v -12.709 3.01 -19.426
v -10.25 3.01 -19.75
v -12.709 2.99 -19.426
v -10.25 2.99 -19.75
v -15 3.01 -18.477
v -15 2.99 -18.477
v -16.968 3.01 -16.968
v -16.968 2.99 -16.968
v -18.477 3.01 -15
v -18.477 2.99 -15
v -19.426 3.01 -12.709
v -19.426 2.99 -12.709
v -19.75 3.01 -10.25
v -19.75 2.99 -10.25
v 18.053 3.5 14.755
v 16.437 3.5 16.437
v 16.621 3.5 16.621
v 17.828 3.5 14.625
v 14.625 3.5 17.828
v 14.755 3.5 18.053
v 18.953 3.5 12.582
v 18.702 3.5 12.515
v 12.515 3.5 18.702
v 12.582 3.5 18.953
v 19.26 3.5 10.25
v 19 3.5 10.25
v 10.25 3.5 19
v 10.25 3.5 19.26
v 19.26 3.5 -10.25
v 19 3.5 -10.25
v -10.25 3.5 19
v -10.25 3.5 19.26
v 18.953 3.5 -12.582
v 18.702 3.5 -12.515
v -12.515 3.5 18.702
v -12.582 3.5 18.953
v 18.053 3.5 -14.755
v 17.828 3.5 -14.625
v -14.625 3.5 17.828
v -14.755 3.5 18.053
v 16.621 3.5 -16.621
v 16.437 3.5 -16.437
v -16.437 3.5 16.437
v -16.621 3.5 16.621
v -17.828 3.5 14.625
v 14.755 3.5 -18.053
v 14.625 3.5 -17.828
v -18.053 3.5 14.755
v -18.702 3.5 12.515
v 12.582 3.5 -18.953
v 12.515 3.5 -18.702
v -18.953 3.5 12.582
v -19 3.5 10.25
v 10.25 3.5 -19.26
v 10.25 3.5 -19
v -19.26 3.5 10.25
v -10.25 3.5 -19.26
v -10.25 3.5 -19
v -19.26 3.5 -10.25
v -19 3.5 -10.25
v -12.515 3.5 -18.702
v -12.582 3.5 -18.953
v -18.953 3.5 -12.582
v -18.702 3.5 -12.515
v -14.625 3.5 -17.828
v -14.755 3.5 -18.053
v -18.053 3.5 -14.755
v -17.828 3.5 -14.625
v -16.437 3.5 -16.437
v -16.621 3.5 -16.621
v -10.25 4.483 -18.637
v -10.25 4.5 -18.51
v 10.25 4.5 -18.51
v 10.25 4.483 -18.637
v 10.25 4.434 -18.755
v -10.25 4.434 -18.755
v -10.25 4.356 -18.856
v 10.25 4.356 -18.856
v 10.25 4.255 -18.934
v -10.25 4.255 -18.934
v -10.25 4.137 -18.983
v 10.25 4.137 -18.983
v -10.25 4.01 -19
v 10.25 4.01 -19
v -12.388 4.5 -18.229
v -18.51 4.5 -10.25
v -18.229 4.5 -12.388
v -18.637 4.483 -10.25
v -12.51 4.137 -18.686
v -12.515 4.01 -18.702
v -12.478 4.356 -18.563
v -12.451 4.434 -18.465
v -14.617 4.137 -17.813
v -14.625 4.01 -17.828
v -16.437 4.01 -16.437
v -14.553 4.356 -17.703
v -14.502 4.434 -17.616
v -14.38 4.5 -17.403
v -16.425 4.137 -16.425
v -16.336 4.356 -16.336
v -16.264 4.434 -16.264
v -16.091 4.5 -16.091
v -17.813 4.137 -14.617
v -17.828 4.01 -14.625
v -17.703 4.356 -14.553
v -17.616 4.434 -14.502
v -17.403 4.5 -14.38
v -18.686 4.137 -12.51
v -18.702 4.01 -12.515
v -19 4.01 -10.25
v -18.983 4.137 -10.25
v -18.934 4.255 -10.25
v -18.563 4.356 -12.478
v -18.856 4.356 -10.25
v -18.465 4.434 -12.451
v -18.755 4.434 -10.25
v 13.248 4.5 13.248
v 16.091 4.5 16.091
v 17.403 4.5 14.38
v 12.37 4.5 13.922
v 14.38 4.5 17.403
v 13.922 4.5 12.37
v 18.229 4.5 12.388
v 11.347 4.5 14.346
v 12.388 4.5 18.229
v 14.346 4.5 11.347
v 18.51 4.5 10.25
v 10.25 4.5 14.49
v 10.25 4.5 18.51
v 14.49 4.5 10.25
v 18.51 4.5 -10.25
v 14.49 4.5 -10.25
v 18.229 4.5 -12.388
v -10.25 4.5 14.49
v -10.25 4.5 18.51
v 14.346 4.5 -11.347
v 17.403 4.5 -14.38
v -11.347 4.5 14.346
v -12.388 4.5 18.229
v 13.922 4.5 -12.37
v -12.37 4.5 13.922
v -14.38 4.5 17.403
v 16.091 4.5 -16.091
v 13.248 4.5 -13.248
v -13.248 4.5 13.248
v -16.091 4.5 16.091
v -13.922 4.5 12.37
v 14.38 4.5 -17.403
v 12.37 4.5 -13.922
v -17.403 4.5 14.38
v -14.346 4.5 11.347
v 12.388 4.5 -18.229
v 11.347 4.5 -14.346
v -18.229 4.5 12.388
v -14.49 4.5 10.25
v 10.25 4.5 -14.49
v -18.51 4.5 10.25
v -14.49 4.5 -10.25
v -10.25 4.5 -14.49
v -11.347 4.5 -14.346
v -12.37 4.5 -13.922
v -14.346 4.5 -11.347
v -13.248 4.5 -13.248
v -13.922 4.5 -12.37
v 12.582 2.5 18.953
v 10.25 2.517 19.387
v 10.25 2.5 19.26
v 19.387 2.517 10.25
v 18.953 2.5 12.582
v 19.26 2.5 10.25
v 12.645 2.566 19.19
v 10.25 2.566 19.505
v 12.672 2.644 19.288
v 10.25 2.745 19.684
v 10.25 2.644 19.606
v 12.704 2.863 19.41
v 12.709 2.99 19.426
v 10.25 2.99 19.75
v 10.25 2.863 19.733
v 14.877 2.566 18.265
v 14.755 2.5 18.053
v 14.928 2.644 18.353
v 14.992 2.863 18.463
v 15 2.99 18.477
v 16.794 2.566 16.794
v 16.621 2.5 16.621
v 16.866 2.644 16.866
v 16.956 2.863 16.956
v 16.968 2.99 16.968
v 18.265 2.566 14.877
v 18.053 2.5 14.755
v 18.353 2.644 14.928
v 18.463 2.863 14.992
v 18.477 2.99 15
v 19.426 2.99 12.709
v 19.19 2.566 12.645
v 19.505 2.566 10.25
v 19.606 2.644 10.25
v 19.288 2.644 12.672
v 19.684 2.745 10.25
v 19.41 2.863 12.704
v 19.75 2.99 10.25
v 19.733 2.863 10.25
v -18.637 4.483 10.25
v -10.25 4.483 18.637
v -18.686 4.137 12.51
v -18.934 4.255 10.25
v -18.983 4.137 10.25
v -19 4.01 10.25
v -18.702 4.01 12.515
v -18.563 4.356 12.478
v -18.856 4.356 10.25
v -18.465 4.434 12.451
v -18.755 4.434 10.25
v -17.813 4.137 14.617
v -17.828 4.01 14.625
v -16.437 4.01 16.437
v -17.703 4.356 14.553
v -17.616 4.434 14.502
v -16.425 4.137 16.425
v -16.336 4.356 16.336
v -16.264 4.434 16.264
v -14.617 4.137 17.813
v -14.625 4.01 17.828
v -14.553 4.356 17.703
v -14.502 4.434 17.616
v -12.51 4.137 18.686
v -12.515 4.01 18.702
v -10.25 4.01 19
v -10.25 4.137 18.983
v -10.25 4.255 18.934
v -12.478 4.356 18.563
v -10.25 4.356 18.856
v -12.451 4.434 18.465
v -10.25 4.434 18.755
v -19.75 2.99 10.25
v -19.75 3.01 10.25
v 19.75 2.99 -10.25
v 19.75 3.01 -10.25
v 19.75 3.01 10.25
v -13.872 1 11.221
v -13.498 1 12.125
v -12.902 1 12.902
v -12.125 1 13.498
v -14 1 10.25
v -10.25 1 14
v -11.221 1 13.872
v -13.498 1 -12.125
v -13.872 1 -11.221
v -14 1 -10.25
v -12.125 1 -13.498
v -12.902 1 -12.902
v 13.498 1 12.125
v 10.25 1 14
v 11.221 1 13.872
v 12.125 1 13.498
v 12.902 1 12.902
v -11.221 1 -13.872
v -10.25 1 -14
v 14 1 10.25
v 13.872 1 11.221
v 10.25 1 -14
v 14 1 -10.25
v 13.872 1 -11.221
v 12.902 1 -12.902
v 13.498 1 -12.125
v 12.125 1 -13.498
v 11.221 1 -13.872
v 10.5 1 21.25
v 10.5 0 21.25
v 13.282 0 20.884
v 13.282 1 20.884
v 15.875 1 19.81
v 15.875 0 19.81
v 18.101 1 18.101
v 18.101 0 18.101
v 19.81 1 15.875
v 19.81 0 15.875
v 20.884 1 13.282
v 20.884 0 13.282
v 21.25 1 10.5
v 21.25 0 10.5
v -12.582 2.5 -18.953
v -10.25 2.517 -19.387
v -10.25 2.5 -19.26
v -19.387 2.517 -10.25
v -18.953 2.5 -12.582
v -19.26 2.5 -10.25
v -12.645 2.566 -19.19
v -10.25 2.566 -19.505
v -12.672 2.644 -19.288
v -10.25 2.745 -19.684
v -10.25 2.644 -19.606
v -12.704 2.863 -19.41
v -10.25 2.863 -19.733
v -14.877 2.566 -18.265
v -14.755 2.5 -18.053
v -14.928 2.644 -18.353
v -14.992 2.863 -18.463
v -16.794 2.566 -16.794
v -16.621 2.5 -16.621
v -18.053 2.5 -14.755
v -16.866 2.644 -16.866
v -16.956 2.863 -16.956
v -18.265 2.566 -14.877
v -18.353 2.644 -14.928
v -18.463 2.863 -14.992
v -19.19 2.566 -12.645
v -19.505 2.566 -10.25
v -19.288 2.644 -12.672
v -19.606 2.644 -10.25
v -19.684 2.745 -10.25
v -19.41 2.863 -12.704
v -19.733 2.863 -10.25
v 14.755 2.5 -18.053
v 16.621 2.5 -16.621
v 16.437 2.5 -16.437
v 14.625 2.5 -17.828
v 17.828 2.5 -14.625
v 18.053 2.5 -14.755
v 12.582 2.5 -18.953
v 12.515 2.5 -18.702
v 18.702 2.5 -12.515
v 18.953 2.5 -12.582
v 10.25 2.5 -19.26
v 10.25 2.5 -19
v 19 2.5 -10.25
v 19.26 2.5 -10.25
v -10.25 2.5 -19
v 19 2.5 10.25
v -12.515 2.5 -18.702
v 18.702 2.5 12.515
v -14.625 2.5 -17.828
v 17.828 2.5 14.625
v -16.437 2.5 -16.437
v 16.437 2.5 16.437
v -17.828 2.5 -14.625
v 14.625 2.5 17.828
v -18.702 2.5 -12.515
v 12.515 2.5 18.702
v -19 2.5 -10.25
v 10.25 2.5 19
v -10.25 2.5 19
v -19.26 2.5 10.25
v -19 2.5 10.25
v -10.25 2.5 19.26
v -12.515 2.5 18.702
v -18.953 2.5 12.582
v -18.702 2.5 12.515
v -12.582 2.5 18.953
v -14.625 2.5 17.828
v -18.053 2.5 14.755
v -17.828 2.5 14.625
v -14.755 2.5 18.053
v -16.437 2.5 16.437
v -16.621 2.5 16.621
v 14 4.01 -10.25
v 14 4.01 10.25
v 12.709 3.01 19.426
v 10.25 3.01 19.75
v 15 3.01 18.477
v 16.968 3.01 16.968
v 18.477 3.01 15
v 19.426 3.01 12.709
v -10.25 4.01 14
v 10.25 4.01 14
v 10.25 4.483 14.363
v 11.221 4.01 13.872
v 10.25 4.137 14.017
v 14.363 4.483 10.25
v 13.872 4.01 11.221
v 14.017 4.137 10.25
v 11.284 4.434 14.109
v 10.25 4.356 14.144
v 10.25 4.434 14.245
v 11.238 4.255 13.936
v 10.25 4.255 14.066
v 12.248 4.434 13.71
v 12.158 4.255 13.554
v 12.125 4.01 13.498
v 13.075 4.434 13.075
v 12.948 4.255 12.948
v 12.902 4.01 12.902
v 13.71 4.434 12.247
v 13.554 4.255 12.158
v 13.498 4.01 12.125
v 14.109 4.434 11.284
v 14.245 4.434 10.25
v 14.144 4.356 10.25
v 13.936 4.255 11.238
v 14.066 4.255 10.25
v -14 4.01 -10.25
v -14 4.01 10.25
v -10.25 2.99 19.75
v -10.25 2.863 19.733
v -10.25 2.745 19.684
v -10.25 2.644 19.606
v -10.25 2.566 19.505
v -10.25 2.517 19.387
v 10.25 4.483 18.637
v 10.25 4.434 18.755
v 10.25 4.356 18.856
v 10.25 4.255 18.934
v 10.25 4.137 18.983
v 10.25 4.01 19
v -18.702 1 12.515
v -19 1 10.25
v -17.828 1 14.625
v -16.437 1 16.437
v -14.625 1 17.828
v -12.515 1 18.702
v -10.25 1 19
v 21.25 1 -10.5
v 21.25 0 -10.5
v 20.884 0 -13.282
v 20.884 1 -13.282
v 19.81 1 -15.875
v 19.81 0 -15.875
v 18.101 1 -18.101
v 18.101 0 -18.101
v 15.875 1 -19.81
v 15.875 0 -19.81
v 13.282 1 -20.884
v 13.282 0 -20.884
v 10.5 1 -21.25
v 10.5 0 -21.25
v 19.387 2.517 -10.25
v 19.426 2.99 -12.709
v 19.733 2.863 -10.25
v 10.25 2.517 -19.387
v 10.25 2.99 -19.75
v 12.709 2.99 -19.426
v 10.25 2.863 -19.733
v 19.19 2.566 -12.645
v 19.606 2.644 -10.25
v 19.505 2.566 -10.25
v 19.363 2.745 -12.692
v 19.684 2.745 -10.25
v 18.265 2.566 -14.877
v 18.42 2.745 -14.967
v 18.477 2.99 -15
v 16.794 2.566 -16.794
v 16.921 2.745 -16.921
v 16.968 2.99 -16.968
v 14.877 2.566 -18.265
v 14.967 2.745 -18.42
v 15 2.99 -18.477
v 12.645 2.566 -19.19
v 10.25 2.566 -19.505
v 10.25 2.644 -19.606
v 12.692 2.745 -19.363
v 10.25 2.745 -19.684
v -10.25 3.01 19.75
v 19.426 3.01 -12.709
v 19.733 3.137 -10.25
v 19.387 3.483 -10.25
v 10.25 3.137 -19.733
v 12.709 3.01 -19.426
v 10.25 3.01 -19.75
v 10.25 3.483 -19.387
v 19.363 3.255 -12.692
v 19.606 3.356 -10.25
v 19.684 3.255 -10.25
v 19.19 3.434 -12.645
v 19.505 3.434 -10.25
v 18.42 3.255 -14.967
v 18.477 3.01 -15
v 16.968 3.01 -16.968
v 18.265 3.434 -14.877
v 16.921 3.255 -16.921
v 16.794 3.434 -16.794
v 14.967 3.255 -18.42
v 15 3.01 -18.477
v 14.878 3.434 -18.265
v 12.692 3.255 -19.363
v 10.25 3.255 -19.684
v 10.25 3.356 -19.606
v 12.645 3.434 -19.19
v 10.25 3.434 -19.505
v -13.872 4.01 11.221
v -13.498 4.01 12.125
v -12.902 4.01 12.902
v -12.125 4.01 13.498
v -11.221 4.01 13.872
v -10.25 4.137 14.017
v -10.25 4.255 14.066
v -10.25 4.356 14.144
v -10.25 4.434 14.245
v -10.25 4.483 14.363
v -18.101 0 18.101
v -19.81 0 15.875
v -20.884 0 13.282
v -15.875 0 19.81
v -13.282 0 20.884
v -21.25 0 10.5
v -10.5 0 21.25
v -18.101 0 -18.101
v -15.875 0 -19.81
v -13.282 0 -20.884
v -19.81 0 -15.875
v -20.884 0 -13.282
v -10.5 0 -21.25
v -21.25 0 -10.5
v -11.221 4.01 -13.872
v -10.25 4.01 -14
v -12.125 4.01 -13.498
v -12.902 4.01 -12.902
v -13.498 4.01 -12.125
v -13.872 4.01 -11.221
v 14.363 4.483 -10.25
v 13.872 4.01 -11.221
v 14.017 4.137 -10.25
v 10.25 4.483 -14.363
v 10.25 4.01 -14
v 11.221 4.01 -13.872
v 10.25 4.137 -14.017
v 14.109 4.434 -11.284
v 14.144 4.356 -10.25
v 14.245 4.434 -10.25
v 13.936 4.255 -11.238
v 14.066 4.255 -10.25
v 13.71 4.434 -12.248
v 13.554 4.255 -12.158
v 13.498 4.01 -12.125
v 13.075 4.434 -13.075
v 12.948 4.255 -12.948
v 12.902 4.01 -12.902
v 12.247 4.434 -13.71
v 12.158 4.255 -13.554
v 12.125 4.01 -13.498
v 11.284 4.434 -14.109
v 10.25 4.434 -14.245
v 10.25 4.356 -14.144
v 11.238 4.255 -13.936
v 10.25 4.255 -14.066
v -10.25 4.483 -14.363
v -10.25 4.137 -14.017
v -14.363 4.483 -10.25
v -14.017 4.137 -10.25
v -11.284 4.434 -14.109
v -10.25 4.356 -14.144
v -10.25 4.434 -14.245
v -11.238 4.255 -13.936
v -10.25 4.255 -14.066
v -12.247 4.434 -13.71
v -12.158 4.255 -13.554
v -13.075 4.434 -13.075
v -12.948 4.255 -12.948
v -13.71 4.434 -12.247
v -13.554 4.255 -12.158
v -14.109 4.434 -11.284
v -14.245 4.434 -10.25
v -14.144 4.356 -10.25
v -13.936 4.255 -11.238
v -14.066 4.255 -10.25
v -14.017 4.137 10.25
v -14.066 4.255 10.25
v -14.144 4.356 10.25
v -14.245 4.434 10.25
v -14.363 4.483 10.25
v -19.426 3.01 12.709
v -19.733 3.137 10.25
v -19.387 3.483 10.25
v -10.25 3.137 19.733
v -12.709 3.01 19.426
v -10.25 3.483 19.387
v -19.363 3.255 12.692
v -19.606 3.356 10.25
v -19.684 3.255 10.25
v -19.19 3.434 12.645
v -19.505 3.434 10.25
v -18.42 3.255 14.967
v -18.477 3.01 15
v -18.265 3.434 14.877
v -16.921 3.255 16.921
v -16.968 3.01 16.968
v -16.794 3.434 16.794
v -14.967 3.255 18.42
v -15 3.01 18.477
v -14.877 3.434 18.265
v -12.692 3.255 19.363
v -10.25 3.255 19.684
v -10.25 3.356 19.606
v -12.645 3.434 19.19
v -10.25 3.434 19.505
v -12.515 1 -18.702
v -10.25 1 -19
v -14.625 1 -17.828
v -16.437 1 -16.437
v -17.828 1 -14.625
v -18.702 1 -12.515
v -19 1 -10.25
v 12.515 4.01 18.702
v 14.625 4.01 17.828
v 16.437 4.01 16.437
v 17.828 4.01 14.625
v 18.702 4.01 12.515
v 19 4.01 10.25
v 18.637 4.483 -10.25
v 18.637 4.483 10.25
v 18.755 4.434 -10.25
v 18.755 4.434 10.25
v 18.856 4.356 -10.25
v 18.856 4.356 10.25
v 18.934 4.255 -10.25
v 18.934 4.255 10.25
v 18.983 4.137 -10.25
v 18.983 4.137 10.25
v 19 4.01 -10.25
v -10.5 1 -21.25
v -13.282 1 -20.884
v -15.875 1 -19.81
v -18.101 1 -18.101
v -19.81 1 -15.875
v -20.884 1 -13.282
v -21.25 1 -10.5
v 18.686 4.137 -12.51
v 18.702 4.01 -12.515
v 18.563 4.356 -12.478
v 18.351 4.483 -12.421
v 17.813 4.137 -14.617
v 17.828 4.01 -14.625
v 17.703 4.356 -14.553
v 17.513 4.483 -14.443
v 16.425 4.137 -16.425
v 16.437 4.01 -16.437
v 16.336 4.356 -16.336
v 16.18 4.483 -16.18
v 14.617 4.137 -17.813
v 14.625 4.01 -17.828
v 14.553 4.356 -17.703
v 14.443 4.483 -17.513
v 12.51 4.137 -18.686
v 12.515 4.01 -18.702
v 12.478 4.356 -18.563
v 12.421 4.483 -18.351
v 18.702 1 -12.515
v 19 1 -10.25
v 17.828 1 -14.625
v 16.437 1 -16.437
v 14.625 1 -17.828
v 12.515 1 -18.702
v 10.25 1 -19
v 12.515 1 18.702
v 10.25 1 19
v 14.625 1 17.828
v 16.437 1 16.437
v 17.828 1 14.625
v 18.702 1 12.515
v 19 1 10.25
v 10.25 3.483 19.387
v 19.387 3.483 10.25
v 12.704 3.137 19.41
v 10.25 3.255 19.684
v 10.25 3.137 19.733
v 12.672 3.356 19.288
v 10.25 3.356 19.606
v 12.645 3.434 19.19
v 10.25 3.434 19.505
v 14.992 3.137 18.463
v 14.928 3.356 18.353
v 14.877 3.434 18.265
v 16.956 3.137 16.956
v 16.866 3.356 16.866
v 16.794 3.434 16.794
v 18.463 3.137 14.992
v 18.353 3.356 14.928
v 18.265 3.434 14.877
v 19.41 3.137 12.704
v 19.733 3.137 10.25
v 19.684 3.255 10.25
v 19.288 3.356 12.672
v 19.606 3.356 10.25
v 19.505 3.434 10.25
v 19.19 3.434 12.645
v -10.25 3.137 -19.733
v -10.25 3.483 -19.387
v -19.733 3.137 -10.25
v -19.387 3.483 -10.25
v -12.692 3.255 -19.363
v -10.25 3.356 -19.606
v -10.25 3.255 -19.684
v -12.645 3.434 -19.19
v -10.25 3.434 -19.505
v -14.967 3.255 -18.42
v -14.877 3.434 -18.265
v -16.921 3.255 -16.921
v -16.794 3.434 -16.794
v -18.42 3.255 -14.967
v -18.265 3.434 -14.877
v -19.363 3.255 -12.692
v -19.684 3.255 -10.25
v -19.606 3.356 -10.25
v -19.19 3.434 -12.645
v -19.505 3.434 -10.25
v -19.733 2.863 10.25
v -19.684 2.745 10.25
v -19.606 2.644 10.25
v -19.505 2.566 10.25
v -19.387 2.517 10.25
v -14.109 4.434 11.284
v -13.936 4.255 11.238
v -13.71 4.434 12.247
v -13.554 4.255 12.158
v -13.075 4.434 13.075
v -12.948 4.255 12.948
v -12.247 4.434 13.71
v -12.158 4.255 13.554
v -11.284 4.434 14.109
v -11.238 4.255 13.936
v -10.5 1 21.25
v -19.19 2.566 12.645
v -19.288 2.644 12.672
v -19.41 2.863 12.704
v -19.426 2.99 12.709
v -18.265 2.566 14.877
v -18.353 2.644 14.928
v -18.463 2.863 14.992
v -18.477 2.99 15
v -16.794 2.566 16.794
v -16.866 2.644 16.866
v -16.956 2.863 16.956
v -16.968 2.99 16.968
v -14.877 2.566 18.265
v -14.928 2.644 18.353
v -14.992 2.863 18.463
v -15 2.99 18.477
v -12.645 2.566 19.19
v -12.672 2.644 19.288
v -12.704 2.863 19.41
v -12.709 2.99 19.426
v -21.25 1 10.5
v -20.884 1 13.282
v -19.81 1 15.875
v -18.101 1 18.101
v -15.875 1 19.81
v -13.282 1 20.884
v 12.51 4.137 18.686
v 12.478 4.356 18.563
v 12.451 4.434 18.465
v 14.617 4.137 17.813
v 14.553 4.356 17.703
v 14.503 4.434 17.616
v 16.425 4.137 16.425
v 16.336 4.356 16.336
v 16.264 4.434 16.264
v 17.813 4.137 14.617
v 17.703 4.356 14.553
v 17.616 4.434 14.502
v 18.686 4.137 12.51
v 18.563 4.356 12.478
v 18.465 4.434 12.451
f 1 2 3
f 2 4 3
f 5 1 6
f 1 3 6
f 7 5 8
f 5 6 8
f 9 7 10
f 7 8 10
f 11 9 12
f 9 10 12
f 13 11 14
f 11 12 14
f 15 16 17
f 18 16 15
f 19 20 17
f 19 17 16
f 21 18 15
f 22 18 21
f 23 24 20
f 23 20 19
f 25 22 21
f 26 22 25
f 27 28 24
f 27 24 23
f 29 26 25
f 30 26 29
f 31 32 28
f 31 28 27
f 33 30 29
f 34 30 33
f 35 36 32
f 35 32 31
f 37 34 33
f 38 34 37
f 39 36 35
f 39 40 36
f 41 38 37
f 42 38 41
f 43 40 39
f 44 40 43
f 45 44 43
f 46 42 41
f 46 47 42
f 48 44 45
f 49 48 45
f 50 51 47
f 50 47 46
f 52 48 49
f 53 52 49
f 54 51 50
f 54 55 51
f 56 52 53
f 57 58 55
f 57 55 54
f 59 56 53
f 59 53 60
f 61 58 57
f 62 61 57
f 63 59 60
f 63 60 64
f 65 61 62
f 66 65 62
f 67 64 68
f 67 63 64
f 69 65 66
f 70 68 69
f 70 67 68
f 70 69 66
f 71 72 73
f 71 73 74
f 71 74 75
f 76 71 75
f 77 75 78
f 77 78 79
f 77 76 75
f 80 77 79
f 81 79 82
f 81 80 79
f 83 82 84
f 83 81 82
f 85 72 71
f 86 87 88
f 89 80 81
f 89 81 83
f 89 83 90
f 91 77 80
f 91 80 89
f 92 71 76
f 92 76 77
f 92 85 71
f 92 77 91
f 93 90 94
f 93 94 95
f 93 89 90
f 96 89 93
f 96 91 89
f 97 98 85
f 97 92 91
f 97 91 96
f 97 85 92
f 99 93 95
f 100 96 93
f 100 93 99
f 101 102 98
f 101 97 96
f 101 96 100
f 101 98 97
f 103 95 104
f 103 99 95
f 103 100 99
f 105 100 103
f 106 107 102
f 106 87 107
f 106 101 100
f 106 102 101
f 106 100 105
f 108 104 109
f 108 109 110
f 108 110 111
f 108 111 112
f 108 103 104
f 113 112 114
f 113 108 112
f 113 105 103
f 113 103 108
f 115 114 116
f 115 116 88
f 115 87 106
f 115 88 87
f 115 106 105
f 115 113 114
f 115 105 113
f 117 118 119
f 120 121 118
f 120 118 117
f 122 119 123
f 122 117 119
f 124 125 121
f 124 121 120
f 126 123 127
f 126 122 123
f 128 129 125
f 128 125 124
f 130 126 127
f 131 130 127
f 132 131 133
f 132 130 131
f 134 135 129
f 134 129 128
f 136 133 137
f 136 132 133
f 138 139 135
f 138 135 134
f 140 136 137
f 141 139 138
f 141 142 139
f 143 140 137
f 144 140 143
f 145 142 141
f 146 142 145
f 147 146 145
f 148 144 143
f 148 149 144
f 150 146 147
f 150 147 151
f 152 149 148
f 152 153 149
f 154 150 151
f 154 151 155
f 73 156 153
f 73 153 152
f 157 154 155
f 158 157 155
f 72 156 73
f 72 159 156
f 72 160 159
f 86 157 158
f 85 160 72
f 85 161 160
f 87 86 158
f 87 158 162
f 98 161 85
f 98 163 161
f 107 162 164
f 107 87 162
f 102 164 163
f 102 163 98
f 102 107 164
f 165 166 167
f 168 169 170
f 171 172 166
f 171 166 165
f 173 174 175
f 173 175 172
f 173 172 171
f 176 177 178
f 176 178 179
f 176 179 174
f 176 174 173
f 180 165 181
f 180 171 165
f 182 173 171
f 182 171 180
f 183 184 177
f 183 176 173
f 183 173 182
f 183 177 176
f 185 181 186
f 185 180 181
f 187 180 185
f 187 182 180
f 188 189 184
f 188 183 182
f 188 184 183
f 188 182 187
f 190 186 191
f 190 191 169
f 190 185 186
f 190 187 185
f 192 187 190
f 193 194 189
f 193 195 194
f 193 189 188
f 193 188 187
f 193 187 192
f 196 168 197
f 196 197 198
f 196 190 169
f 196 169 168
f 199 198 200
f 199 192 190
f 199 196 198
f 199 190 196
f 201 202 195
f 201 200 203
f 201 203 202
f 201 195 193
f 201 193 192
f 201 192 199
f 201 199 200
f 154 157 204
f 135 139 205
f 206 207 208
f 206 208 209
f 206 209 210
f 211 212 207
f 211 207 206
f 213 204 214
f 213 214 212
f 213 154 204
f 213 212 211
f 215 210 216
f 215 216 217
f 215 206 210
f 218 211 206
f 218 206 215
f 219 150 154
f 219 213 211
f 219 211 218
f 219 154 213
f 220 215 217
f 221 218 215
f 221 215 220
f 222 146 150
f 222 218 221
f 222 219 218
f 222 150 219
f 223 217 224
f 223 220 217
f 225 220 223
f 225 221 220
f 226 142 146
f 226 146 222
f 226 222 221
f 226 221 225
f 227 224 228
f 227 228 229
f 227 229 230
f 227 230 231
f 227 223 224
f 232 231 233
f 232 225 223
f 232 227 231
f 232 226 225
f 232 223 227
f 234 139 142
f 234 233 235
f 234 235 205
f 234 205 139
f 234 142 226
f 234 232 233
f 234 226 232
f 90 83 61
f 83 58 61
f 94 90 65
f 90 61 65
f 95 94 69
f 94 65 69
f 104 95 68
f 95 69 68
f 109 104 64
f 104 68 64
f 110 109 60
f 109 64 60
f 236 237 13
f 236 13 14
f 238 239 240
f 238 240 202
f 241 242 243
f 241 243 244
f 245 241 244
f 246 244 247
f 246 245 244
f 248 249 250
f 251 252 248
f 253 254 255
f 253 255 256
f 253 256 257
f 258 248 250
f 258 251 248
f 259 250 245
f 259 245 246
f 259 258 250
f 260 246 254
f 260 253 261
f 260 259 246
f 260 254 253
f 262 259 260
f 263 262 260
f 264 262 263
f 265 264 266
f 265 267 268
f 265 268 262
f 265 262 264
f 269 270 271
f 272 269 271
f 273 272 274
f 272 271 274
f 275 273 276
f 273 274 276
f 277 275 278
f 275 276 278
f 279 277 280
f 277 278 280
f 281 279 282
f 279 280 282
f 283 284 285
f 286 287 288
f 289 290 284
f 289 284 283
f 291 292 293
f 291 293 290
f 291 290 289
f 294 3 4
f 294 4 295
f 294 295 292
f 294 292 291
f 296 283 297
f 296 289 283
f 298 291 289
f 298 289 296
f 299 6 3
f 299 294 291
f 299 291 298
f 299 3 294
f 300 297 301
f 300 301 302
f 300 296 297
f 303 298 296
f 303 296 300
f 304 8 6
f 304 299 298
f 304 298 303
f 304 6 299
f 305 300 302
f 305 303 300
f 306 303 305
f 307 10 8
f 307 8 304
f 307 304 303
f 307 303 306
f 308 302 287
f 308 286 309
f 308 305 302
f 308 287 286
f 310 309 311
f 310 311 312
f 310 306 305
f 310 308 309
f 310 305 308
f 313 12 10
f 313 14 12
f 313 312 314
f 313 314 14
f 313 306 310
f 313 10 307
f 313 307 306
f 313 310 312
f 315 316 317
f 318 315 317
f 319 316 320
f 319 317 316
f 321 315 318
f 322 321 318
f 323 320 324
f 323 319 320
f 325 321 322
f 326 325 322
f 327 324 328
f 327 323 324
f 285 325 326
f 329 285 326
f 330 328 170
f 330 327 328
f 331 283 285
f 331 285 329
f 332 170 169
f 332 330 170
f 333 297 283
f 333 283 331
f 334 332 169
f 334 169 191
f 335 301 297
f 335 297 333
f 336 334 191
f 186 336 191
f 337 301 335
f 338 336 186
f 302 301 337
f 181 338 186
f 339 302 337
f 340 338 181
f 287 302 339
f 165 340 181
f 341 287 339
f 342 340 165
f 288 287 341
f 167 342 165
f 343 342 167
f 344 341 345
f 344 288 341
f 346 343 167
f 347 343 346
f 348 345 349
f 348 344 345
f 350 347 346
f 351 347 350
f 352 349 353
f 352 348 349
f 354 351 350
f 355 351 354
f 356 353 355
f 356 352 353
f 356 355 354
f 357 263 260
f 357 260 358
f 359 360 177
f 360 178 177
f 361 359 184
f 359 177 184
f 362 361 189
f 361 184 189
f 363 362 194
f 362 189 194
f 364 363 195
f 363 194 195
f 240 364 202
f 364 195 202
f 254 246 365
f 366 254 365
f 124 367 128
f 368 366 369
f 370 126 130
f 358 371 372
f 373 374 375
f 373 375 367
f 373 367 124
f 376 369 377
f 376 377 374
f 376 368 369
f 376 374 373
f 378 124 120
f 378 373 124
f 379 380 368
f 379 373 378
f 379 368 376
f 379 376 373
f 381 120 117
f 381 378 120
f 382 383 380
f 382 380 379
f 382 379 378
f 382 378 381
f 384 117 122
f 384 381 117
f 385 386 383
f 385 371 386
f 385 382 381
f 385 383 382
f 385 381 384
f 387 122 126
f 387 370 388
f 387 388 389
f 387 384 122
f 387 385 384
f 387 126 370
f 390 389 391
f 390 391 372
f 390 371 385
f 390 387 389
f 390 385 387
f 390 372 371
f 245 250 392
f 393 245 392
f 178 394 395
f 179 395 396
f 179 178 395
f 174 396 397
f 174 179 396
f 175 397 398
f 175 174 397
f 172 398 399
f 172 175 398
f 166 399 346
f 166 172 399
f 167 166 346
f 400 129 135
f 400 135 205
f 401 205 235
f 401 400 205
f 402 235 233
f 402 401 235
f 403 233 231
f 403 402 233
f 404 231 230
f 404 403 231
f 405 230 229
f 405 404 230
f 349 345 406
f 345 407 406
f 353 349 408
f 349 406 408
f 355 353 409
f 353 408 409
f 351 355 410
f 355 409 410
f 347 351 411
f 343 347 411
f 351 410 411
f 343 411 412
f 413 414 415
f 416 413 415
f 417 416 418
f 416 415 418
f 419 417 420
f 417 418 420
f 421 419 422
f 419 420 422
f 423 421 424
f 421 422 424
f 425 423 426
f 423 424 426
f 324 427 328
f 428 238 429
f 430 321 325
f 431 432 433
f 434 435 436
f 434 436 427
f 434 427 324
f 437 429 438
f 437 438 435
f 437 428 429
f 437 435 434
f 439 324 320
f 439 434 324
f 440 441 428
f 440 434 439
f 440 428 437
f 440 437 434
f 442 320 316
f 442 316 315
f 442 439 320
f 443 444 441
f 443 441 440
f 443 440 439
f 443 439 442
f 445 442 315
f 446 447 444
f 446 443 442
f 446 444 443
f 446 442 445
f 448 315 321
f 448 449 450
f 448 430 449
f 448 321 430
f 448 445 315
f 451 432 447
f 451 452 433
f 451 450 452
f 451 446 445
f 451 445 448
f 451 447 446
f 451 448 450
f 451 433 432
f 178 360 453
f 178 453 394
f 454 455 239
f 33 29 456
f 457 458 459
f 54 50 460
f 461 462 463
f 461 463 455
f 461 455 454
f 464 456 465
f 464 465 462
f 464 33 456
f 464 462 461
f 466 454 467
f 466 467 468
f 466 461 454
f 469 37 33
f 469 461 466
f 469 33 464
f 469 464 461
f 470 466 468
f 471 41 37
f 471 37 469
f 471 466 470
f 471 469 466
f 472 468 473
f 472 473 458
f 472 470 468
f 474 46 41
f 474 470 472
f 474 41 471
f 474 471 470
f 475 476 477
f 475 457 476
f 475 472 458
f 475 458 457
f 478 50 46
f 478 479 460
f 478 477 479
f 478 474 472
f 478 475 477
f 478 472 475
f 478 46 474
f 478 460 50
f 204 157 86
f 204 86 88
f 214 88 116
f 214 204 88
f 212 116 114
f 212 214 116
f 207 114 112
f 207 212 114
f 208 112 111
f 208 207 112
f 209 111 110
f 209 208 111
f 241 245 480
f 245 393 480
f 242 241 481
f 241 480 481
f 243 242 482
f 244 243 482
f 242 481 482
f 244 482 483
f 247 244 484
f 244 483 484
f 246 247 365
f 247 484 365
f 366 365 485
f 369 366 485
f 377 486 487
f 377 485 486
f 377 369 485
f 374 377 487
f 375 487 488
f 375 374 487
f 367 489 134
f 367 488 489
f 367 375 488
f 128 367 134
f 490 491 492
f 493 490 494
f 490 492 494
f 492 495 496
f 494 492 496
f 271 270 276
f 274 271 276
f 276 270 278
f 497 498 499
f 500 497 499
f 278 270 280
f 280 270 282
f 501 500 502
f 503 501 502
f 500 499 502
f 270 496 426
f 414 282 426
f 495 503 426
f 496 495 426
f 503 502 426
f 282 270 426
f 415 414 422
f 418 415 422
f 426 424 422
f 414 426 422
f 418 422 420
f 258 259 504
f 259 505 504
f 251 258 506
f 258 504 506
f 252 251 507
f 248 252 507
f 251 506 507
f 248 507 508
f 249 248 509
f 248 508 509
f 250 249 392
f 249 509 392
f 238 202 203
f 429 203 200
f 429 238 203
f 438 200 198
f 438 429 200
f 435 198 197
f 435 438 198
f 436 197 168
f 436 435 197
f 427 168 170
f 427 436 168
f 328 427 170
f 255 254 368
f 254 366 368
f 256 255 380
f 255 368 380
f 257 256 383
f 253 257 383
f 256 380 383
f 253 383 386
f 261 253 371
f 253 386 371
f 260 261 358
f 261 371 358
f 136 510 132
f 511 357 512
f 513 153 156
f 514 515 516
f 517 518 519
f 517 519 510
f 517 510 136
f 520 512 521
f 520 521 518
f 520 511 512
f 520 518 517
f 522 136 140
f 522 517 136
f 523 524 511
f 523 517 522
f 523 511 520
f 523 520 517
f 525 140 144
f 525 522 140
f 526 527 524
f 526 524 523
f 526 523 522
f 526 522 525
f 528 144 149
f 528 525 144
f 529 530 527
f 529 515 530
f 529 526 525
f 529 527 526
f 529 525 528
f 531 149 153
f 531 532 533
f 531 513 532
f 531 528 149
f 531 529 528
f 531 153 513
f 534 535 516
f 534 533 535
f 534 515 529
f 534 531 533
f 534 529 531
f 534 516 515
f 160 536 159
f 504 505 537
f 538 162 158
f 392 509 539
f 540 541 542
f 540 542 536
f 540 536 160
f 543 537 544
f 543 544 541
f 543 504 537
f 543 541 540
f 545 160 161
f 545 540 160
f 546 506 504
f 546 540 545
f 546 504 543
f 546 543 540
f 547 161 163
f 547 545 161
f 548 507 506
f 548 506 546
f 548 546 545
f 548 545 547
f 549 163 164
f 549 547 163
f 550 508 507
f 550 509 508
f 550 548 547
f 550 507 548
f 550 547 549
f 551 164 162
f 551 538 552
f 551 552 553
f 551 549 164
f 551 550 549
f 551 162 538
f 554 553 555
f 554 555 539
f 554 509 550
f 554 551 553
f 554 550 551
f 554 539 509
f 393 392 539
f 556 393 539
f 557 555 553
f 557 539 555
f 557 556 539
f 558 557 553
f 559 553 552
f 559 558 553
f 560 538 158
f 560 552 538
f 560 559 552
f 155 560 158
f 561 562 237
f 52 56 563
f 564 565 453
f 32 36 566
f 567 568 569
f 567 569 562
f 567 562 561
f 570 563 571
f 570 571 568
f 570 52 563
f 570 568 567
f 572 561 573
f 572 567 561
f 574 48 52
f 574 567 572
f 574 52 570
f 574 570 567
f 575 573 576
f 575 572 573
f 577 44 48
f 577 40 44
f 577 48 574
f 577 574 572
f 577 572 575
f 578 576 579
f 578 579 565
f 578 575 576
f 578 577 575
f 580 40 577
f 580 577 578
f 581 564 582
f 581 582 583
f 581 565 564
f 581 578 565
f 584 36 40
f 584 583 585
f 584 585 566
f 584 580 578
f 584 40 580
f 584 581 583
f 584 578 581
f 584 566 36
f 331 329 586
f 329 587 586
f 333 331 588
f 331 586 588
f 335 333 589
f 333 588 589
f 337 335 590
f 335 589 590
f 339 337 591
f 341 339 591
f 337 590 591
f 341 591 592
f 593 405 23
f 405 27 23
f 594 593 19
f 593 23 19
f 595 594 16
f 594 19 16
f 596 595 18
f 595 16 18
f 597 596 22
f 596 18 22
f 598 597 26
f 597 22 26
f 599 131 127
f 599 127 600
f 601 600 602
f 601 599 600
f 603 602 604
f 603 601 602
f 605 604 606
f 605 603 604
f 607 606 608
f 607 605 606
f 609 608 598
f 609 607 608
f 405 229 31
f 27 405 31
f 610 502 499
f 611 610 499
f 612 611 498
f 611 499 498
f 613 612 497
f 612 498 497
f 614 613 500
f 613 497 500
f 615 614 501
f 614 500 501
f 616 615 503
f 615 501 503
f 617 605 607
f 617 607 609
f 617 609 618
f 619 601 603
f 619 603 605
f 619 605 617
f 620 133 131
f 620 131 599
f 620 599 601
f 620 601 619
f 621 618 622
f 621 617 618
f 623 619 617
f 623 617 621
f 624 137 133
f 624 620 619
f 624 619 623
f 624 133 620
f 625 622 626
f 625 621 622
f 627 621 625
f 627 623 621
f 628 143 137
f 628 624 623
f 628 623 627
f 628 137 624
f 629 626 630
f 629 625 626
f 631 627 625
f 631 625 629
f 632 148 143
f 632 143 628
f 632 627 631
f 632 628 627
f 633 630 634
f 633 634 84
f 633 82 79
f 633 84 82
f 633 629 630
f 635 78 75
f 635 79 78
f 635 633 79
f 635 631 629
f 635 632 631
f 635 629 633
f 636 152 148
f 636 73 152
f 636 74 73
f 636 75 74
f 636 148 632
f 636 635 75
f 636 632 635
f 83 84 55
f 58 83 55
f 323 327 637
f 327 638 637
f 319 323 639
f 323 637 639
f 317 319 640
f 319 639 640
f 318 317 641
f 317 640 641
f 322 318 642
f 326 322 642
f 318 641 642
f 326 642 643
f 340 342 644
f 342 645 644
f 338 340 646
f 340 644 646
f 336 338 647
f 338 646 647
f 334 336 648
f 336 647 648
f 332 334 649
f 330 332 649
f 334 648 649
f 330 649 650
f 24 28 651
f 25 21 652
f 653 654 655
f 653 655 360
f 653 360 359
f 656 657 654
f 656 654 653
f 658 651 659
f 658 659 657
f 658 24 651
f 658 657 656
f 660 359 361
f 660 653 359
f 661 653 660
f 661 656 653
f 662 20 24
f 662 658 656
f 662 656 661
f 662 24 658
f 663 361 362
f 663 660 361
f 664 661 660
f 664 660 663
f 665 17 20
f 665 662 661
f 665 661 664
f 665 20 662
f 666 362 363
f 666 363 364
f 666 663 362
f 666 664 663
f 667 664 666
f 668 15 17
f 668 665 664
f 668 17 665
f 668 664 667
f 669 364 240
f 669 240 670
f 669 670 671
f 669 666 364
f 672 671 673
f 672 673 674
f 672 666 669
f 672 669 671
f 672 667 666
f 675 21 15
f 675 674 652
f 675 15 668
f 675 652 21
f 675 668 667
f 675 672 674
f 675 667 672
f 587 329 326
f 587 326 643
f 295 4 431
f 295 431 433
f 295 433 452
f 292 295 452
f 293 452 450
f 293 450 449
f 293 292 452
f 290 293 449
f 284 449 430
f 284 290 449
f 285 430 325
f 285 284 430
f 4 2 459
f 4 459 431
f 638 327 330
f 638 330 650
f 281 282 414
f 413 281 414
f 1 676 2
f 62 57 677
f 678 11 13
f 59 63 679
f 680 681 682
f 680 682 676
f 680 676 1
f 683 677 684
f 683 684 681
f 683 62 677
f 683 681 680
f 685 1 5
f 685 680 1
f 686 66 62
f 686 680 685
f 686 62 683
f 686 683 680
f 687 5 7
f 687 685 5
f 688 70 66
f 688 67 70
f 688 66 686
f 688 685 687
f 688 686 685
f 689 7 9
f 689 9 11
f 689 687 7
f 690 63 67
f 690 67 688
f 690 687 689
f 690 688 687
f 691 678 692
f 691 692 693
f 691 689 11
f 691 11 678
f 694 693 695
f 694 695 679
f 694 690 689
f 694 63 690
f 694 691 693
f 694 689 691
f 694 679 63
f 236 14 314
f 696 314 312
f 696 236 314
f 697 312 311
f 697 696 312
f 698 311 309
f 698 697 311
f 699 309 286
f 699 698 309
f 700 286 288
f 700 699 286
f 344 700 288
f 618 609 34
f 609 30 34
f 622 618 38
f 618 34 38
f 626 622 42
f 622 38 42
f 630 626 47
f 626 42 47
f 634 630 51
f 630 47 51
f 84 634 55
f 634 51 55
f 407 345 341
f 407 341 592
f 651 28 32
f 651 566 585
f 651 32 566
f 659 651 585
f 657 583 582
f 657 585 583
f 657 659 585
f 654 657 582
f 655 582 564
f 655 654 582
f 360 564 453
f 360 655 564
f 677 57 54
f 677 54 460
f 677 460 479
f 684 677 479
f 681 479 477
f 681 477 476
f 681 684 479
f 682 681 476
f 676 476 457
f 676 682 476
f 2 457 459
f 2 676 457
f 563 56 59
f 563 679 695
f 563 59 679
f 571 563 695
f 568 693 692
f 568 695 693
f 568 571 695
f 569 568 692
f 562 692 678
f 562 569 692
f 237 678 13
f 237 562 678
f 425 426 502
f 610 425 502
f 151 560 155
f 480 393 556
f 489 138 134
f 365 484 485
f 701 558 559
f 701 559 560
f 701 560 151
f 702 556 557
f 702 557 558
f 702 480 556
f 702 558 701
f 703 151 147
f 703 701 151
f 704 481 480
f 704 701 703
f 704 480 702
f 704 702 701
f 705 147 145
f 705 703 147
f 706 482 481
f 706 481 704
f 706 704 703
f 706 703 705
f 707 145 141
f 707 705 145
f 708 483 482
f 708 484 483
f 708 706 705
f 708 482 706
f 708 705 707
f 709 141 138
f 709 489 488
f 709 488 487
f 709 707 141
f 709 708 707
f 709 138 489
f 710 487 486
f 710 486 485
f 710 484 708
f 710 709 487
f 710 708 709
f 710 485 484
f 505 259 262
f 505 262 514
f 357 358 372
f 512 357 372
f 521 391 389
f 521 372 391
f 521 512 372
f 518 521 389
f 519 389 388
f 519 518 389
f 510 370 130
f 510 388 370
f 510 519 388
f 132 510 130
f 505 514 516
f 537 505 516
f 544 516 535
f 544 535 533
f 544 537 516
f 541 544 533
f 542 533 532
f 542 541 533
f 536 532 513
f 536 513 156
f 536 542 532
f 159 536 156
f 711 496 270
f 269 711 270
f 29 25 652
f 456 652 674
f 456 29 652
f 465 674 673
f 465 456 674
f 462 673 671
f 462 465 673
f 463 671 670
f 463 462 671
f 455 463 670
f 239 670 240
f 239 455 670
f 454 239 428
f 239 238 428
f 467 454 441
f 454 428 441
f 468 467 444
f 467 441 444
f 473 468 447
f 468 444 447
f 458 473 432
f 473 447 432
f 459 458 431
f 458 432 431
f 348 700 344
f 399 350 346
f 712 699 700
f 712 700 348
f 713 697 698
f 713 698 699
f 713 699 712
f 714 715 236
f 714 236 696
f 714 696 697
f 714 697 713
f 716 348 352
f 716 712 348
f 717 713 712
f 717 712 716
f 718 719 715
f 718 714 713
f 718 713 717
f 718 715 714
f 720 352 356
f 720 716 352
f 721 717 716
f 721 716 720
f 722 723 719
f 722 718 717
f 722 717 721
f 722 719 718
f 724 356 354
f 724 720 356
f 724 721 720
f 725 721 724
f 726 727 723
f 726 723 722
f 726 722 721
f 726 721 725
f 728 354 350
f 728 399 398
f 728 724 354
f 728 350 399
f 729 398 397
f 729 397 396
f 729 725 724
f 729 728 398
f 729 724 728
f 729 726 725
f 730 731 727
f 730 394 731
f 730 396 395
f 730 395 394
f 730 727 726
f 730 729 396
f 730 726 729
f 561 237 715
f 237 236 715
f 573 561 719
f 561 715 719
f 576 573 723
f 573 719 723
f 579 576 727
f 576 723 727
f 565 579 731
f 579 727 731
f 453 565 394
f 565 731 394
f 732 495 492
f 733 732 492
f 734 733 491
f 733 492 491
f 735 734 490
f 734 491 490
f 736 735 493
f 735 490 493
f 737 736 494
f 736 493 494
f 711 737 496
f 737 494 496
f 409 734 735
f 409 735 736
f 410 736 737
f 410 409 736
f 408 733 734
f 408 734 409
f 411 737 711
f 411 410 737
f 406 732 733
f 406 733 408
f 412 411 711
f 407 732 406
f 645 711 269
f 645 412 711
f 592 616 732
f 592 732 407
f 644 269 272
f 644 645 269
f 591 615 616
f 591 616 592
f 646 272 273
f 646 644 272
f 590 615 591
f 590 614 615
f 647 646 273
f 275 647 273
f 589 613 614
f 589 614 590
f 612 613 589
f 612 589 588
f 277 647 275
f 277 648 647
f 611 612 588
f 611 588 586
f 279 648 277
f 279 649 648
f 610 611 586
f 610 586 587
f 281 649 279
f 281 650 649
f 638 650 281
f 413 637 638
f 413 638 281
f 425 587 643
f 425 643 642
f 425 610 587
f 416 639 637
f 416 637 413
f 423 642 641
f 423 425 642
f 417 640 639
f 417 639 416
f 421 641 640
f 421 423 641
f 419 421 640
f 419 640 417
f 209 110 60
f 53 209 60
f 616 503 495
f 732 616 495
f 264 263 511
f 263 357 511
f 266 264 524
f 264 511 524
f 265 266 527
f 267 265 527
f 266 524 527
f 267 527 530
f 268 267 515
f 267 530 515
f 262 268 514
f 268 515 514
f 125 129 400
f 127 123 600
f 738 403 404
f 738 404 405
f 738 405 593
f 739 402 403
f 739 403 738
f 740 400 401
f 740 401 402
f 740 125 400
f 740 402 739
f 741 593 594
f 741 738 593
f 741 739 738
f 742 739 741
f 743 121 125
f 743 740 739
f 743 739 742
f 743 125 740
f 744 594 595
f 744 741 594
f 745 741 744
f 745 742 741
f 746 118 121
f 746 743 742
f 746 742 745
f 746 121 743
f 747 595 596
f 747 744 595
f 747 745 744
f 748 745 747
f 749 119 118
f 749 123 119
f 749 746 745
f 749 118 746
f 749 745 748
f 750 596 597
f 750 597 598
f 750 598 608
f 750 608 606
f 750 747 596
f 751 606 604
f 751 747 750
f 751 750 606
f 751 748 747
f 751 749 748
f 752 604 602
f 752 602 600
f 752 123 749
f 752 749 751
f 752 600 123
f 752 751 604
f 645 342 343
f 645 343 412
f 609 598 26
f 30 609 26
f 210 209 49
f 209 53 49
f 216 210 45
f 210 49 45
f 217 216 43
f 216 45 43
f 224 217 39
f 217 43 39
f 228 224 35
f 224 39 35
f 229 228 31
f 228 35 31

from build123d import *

# Parameters (mm, degrees)
BOSS_EXTRUDE1_DEPTH = 1


with BuildPart() as part:
    # Sketch2 → Boss-Extrude1 (new body)
    with BuildSketch(Plane(origin=(0, 0, 0), x_dir=(1, 0, 0), z_dir=(0, 1, 0))):
        with BuildLine():
            Line((-10.5, -21.25), (10.5, -21.25))
            ThreePointArc((10.5, -21.25), (18.101397898, -18.101397898), (21.25, -10.5))
            Line((21.25, -10.5), (21.25, 10.5))
            ThreePointArc((21.25, 10.5), (18.101397898, 18.101397898), (10.5, 21.25))
            Line((10.5, 21.25), (-10.5, 21.25))
            ThreePointArc((-10.5, 21.25), (-18.101397898, 18.101397898), (-21.25, 10.5))
            Line((-21.25, 10.5), (-21.25, -10.5))
            ThreePointArc((-21.25, -10.5), (-18.101397898, -18.101397898), (-10.5, -21.25))
        make_face()
    extrude(amount=BOSS_EXTRUDE1_DEPTH)

    # Sweep3: sweep along a path in Sketch3
    with BuildLine(Plane(origin=(0, 1, 0), x_dir=(1, 0, 0), z_dir=(0, 1, 0))) as sweep3_path:
        Line((10.25, 19), (-10.25, 19))
        ThreePointArc((-10.25, 19), (-16.437184335, 16.437184335), (-19, 10.25))
        Line((-19, 10.25), (-19, -10.25))
        ThreePointArc((-19, -10.25), (-16.437184335, -16.437184335), (-10.25, -19))
        Line((-10.25, -19), (10.25, -19))
        ThreePointArc((10.25, -19), (16.437184335, -16.437184335), (19, -10.25))
        Line((19, -10.25), (19, 10.25))
        ThreePointArc((19, 10.25), (16.437184335, 16.437184335), (10.25, 19))
    # Sketch11 → Sweep3 (sweep)
    with BuildSketch(Plane.XY):
        with BuildLine():
            Line((-14, 1), (-19, 1))
            Line((-19, 1), (-19, 2.5))
            Line((-19, 2.5), (-19.26, 2.5))
            ThreePointArc((-19.26, 2.5), (-19.606482323, 2.643517677), (-19.75, 2.99))
            Line((-19.75, 2.99), (-19.75, 3.01))
            ThreePointArc((-19.75, 3.01), (-19.606482323, 3.356482323), (-19.26, 3.5))
            Line((-19.26, 3.5), (-19, 3.5))
            Line((-19, 3.5), (-19, 4.01))
            ThreePointArc((-19, 4.01), (-18.856482323, 4.356482323), (-18.51, 4.5))
            Line((-18.51, 4.5), (-14.49, 4.5))
            ThreePointArc((-14.49, 4.5), (-14.143517677, 4.356482323), (-14, 4.01))
            Line((-14, 4.01), (-14, 1))
        make_face()
    sweep(path=sweep3_path.line)


solid = part.part
